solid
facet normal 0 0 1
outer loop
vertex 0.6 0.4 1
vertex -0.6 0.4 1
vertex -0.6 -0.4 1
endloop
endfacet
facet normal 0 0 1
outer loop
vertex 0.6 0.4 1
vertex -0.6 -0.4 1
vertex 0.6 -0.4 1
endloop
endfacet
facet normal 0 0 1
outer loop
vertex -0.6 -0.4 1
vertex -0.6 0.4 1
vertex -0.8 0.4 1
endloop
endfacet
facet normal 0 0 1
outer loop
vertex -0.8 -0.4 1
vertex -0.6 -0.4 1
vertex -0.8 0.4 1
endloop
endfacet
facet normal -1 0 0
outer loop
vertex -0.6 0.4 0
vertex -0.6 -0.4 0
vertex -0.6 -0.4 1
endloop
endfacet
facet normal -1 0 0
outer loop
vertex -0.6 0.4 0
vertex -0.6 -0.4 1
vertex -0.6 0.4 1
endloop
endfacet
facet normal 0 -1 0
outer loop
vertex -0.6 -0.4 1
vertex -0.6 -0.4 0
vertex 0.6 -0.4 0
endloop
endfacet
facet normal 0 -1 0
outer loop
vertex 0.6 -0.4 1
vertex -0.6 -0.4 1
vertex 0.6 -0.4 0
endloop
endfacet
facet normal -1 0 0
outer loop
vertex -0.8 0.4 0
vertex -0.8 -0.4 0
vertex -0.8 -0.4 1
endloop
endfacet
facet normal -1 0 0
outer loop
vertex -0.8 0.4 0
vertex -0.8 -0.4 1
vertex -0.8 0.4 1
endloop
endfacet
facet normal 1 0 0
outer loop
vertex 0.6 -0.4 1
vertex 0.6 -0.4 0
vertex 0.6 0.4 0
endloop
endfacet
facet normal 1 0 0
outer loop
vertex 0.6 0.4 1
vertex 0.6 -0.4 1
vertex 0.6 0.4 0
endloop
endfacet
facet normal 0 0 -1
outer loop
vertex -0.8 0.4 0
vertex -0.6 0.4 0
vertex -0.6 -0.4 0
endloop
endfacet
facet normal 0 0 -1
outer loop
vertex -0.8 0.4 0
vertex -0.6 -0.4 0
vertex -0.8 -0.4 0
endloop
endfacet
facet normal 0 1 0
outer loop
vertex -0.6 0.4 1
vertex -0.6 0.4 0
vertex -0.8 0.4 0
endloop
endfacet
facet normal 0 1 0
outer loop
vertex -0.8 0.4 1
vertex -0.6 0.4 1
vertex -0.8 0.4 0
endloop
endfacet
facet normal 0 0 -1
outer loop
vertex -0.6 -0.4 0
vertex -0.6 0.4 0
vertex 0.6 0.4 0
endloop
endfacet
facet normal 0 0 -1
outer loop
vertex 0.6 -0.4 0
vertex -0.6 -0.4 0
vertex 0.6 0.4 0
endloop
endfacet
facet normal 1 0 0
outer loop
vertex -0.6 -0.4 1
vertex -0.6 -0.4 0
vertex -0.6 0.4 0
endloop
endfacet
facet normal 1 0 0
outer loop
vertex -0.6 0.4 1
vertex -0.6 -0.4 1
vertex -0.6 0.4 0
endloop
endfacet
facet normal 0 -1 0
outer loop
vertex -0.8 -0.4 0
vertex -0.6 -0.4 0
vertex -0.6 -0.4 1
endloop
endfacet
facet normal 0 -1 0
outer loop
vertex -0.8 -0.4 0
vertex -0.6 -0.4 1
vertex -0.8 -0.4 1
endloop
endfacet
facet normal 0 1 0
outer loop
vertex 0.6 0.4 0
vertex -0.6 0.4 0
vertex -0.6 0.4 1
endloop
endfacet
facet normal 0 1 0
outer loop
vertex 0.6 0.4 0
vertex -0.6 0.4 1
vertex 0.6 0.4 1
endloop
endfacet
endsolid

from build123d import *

# Parameters (mm, degrees)
SKETCH_W     = 1.2
SKETCH_H     = 0.8
PAD_DEPTH    = 1
SKETCH001_W  = 0.2
SKETCH001_H  = 0.8
PAD001_DEPTH = 1


with BuildPart() as body:
    # Sketch → Pad (new body)
    with BuildSketch(Plane.XY):
        Rectangle(SKETCH_W, SKETCH_H)
    extrude(amount=PAD_DEPTH)


with BuildPart() as body001:
    # Sketch001 → Pad001 (new body)
    with BuildSketch(Plane.XY):
        with Locations((0.7, 0)):
            Rectangle(SKETCH001_W, SKETCH001_H)
    extrude(amount=PAD001_DEPTH)


with BuildPart() as part_mirroring:
    # Part__Mirroring: instance of Body001
    add(body001.part.mirror(Plane(origin=(0, 0, 0), x_dir=(0, -1, 0), z_dir=(1, 0, 0))))


solid = Compound([body.part, part_mirroring.part])
